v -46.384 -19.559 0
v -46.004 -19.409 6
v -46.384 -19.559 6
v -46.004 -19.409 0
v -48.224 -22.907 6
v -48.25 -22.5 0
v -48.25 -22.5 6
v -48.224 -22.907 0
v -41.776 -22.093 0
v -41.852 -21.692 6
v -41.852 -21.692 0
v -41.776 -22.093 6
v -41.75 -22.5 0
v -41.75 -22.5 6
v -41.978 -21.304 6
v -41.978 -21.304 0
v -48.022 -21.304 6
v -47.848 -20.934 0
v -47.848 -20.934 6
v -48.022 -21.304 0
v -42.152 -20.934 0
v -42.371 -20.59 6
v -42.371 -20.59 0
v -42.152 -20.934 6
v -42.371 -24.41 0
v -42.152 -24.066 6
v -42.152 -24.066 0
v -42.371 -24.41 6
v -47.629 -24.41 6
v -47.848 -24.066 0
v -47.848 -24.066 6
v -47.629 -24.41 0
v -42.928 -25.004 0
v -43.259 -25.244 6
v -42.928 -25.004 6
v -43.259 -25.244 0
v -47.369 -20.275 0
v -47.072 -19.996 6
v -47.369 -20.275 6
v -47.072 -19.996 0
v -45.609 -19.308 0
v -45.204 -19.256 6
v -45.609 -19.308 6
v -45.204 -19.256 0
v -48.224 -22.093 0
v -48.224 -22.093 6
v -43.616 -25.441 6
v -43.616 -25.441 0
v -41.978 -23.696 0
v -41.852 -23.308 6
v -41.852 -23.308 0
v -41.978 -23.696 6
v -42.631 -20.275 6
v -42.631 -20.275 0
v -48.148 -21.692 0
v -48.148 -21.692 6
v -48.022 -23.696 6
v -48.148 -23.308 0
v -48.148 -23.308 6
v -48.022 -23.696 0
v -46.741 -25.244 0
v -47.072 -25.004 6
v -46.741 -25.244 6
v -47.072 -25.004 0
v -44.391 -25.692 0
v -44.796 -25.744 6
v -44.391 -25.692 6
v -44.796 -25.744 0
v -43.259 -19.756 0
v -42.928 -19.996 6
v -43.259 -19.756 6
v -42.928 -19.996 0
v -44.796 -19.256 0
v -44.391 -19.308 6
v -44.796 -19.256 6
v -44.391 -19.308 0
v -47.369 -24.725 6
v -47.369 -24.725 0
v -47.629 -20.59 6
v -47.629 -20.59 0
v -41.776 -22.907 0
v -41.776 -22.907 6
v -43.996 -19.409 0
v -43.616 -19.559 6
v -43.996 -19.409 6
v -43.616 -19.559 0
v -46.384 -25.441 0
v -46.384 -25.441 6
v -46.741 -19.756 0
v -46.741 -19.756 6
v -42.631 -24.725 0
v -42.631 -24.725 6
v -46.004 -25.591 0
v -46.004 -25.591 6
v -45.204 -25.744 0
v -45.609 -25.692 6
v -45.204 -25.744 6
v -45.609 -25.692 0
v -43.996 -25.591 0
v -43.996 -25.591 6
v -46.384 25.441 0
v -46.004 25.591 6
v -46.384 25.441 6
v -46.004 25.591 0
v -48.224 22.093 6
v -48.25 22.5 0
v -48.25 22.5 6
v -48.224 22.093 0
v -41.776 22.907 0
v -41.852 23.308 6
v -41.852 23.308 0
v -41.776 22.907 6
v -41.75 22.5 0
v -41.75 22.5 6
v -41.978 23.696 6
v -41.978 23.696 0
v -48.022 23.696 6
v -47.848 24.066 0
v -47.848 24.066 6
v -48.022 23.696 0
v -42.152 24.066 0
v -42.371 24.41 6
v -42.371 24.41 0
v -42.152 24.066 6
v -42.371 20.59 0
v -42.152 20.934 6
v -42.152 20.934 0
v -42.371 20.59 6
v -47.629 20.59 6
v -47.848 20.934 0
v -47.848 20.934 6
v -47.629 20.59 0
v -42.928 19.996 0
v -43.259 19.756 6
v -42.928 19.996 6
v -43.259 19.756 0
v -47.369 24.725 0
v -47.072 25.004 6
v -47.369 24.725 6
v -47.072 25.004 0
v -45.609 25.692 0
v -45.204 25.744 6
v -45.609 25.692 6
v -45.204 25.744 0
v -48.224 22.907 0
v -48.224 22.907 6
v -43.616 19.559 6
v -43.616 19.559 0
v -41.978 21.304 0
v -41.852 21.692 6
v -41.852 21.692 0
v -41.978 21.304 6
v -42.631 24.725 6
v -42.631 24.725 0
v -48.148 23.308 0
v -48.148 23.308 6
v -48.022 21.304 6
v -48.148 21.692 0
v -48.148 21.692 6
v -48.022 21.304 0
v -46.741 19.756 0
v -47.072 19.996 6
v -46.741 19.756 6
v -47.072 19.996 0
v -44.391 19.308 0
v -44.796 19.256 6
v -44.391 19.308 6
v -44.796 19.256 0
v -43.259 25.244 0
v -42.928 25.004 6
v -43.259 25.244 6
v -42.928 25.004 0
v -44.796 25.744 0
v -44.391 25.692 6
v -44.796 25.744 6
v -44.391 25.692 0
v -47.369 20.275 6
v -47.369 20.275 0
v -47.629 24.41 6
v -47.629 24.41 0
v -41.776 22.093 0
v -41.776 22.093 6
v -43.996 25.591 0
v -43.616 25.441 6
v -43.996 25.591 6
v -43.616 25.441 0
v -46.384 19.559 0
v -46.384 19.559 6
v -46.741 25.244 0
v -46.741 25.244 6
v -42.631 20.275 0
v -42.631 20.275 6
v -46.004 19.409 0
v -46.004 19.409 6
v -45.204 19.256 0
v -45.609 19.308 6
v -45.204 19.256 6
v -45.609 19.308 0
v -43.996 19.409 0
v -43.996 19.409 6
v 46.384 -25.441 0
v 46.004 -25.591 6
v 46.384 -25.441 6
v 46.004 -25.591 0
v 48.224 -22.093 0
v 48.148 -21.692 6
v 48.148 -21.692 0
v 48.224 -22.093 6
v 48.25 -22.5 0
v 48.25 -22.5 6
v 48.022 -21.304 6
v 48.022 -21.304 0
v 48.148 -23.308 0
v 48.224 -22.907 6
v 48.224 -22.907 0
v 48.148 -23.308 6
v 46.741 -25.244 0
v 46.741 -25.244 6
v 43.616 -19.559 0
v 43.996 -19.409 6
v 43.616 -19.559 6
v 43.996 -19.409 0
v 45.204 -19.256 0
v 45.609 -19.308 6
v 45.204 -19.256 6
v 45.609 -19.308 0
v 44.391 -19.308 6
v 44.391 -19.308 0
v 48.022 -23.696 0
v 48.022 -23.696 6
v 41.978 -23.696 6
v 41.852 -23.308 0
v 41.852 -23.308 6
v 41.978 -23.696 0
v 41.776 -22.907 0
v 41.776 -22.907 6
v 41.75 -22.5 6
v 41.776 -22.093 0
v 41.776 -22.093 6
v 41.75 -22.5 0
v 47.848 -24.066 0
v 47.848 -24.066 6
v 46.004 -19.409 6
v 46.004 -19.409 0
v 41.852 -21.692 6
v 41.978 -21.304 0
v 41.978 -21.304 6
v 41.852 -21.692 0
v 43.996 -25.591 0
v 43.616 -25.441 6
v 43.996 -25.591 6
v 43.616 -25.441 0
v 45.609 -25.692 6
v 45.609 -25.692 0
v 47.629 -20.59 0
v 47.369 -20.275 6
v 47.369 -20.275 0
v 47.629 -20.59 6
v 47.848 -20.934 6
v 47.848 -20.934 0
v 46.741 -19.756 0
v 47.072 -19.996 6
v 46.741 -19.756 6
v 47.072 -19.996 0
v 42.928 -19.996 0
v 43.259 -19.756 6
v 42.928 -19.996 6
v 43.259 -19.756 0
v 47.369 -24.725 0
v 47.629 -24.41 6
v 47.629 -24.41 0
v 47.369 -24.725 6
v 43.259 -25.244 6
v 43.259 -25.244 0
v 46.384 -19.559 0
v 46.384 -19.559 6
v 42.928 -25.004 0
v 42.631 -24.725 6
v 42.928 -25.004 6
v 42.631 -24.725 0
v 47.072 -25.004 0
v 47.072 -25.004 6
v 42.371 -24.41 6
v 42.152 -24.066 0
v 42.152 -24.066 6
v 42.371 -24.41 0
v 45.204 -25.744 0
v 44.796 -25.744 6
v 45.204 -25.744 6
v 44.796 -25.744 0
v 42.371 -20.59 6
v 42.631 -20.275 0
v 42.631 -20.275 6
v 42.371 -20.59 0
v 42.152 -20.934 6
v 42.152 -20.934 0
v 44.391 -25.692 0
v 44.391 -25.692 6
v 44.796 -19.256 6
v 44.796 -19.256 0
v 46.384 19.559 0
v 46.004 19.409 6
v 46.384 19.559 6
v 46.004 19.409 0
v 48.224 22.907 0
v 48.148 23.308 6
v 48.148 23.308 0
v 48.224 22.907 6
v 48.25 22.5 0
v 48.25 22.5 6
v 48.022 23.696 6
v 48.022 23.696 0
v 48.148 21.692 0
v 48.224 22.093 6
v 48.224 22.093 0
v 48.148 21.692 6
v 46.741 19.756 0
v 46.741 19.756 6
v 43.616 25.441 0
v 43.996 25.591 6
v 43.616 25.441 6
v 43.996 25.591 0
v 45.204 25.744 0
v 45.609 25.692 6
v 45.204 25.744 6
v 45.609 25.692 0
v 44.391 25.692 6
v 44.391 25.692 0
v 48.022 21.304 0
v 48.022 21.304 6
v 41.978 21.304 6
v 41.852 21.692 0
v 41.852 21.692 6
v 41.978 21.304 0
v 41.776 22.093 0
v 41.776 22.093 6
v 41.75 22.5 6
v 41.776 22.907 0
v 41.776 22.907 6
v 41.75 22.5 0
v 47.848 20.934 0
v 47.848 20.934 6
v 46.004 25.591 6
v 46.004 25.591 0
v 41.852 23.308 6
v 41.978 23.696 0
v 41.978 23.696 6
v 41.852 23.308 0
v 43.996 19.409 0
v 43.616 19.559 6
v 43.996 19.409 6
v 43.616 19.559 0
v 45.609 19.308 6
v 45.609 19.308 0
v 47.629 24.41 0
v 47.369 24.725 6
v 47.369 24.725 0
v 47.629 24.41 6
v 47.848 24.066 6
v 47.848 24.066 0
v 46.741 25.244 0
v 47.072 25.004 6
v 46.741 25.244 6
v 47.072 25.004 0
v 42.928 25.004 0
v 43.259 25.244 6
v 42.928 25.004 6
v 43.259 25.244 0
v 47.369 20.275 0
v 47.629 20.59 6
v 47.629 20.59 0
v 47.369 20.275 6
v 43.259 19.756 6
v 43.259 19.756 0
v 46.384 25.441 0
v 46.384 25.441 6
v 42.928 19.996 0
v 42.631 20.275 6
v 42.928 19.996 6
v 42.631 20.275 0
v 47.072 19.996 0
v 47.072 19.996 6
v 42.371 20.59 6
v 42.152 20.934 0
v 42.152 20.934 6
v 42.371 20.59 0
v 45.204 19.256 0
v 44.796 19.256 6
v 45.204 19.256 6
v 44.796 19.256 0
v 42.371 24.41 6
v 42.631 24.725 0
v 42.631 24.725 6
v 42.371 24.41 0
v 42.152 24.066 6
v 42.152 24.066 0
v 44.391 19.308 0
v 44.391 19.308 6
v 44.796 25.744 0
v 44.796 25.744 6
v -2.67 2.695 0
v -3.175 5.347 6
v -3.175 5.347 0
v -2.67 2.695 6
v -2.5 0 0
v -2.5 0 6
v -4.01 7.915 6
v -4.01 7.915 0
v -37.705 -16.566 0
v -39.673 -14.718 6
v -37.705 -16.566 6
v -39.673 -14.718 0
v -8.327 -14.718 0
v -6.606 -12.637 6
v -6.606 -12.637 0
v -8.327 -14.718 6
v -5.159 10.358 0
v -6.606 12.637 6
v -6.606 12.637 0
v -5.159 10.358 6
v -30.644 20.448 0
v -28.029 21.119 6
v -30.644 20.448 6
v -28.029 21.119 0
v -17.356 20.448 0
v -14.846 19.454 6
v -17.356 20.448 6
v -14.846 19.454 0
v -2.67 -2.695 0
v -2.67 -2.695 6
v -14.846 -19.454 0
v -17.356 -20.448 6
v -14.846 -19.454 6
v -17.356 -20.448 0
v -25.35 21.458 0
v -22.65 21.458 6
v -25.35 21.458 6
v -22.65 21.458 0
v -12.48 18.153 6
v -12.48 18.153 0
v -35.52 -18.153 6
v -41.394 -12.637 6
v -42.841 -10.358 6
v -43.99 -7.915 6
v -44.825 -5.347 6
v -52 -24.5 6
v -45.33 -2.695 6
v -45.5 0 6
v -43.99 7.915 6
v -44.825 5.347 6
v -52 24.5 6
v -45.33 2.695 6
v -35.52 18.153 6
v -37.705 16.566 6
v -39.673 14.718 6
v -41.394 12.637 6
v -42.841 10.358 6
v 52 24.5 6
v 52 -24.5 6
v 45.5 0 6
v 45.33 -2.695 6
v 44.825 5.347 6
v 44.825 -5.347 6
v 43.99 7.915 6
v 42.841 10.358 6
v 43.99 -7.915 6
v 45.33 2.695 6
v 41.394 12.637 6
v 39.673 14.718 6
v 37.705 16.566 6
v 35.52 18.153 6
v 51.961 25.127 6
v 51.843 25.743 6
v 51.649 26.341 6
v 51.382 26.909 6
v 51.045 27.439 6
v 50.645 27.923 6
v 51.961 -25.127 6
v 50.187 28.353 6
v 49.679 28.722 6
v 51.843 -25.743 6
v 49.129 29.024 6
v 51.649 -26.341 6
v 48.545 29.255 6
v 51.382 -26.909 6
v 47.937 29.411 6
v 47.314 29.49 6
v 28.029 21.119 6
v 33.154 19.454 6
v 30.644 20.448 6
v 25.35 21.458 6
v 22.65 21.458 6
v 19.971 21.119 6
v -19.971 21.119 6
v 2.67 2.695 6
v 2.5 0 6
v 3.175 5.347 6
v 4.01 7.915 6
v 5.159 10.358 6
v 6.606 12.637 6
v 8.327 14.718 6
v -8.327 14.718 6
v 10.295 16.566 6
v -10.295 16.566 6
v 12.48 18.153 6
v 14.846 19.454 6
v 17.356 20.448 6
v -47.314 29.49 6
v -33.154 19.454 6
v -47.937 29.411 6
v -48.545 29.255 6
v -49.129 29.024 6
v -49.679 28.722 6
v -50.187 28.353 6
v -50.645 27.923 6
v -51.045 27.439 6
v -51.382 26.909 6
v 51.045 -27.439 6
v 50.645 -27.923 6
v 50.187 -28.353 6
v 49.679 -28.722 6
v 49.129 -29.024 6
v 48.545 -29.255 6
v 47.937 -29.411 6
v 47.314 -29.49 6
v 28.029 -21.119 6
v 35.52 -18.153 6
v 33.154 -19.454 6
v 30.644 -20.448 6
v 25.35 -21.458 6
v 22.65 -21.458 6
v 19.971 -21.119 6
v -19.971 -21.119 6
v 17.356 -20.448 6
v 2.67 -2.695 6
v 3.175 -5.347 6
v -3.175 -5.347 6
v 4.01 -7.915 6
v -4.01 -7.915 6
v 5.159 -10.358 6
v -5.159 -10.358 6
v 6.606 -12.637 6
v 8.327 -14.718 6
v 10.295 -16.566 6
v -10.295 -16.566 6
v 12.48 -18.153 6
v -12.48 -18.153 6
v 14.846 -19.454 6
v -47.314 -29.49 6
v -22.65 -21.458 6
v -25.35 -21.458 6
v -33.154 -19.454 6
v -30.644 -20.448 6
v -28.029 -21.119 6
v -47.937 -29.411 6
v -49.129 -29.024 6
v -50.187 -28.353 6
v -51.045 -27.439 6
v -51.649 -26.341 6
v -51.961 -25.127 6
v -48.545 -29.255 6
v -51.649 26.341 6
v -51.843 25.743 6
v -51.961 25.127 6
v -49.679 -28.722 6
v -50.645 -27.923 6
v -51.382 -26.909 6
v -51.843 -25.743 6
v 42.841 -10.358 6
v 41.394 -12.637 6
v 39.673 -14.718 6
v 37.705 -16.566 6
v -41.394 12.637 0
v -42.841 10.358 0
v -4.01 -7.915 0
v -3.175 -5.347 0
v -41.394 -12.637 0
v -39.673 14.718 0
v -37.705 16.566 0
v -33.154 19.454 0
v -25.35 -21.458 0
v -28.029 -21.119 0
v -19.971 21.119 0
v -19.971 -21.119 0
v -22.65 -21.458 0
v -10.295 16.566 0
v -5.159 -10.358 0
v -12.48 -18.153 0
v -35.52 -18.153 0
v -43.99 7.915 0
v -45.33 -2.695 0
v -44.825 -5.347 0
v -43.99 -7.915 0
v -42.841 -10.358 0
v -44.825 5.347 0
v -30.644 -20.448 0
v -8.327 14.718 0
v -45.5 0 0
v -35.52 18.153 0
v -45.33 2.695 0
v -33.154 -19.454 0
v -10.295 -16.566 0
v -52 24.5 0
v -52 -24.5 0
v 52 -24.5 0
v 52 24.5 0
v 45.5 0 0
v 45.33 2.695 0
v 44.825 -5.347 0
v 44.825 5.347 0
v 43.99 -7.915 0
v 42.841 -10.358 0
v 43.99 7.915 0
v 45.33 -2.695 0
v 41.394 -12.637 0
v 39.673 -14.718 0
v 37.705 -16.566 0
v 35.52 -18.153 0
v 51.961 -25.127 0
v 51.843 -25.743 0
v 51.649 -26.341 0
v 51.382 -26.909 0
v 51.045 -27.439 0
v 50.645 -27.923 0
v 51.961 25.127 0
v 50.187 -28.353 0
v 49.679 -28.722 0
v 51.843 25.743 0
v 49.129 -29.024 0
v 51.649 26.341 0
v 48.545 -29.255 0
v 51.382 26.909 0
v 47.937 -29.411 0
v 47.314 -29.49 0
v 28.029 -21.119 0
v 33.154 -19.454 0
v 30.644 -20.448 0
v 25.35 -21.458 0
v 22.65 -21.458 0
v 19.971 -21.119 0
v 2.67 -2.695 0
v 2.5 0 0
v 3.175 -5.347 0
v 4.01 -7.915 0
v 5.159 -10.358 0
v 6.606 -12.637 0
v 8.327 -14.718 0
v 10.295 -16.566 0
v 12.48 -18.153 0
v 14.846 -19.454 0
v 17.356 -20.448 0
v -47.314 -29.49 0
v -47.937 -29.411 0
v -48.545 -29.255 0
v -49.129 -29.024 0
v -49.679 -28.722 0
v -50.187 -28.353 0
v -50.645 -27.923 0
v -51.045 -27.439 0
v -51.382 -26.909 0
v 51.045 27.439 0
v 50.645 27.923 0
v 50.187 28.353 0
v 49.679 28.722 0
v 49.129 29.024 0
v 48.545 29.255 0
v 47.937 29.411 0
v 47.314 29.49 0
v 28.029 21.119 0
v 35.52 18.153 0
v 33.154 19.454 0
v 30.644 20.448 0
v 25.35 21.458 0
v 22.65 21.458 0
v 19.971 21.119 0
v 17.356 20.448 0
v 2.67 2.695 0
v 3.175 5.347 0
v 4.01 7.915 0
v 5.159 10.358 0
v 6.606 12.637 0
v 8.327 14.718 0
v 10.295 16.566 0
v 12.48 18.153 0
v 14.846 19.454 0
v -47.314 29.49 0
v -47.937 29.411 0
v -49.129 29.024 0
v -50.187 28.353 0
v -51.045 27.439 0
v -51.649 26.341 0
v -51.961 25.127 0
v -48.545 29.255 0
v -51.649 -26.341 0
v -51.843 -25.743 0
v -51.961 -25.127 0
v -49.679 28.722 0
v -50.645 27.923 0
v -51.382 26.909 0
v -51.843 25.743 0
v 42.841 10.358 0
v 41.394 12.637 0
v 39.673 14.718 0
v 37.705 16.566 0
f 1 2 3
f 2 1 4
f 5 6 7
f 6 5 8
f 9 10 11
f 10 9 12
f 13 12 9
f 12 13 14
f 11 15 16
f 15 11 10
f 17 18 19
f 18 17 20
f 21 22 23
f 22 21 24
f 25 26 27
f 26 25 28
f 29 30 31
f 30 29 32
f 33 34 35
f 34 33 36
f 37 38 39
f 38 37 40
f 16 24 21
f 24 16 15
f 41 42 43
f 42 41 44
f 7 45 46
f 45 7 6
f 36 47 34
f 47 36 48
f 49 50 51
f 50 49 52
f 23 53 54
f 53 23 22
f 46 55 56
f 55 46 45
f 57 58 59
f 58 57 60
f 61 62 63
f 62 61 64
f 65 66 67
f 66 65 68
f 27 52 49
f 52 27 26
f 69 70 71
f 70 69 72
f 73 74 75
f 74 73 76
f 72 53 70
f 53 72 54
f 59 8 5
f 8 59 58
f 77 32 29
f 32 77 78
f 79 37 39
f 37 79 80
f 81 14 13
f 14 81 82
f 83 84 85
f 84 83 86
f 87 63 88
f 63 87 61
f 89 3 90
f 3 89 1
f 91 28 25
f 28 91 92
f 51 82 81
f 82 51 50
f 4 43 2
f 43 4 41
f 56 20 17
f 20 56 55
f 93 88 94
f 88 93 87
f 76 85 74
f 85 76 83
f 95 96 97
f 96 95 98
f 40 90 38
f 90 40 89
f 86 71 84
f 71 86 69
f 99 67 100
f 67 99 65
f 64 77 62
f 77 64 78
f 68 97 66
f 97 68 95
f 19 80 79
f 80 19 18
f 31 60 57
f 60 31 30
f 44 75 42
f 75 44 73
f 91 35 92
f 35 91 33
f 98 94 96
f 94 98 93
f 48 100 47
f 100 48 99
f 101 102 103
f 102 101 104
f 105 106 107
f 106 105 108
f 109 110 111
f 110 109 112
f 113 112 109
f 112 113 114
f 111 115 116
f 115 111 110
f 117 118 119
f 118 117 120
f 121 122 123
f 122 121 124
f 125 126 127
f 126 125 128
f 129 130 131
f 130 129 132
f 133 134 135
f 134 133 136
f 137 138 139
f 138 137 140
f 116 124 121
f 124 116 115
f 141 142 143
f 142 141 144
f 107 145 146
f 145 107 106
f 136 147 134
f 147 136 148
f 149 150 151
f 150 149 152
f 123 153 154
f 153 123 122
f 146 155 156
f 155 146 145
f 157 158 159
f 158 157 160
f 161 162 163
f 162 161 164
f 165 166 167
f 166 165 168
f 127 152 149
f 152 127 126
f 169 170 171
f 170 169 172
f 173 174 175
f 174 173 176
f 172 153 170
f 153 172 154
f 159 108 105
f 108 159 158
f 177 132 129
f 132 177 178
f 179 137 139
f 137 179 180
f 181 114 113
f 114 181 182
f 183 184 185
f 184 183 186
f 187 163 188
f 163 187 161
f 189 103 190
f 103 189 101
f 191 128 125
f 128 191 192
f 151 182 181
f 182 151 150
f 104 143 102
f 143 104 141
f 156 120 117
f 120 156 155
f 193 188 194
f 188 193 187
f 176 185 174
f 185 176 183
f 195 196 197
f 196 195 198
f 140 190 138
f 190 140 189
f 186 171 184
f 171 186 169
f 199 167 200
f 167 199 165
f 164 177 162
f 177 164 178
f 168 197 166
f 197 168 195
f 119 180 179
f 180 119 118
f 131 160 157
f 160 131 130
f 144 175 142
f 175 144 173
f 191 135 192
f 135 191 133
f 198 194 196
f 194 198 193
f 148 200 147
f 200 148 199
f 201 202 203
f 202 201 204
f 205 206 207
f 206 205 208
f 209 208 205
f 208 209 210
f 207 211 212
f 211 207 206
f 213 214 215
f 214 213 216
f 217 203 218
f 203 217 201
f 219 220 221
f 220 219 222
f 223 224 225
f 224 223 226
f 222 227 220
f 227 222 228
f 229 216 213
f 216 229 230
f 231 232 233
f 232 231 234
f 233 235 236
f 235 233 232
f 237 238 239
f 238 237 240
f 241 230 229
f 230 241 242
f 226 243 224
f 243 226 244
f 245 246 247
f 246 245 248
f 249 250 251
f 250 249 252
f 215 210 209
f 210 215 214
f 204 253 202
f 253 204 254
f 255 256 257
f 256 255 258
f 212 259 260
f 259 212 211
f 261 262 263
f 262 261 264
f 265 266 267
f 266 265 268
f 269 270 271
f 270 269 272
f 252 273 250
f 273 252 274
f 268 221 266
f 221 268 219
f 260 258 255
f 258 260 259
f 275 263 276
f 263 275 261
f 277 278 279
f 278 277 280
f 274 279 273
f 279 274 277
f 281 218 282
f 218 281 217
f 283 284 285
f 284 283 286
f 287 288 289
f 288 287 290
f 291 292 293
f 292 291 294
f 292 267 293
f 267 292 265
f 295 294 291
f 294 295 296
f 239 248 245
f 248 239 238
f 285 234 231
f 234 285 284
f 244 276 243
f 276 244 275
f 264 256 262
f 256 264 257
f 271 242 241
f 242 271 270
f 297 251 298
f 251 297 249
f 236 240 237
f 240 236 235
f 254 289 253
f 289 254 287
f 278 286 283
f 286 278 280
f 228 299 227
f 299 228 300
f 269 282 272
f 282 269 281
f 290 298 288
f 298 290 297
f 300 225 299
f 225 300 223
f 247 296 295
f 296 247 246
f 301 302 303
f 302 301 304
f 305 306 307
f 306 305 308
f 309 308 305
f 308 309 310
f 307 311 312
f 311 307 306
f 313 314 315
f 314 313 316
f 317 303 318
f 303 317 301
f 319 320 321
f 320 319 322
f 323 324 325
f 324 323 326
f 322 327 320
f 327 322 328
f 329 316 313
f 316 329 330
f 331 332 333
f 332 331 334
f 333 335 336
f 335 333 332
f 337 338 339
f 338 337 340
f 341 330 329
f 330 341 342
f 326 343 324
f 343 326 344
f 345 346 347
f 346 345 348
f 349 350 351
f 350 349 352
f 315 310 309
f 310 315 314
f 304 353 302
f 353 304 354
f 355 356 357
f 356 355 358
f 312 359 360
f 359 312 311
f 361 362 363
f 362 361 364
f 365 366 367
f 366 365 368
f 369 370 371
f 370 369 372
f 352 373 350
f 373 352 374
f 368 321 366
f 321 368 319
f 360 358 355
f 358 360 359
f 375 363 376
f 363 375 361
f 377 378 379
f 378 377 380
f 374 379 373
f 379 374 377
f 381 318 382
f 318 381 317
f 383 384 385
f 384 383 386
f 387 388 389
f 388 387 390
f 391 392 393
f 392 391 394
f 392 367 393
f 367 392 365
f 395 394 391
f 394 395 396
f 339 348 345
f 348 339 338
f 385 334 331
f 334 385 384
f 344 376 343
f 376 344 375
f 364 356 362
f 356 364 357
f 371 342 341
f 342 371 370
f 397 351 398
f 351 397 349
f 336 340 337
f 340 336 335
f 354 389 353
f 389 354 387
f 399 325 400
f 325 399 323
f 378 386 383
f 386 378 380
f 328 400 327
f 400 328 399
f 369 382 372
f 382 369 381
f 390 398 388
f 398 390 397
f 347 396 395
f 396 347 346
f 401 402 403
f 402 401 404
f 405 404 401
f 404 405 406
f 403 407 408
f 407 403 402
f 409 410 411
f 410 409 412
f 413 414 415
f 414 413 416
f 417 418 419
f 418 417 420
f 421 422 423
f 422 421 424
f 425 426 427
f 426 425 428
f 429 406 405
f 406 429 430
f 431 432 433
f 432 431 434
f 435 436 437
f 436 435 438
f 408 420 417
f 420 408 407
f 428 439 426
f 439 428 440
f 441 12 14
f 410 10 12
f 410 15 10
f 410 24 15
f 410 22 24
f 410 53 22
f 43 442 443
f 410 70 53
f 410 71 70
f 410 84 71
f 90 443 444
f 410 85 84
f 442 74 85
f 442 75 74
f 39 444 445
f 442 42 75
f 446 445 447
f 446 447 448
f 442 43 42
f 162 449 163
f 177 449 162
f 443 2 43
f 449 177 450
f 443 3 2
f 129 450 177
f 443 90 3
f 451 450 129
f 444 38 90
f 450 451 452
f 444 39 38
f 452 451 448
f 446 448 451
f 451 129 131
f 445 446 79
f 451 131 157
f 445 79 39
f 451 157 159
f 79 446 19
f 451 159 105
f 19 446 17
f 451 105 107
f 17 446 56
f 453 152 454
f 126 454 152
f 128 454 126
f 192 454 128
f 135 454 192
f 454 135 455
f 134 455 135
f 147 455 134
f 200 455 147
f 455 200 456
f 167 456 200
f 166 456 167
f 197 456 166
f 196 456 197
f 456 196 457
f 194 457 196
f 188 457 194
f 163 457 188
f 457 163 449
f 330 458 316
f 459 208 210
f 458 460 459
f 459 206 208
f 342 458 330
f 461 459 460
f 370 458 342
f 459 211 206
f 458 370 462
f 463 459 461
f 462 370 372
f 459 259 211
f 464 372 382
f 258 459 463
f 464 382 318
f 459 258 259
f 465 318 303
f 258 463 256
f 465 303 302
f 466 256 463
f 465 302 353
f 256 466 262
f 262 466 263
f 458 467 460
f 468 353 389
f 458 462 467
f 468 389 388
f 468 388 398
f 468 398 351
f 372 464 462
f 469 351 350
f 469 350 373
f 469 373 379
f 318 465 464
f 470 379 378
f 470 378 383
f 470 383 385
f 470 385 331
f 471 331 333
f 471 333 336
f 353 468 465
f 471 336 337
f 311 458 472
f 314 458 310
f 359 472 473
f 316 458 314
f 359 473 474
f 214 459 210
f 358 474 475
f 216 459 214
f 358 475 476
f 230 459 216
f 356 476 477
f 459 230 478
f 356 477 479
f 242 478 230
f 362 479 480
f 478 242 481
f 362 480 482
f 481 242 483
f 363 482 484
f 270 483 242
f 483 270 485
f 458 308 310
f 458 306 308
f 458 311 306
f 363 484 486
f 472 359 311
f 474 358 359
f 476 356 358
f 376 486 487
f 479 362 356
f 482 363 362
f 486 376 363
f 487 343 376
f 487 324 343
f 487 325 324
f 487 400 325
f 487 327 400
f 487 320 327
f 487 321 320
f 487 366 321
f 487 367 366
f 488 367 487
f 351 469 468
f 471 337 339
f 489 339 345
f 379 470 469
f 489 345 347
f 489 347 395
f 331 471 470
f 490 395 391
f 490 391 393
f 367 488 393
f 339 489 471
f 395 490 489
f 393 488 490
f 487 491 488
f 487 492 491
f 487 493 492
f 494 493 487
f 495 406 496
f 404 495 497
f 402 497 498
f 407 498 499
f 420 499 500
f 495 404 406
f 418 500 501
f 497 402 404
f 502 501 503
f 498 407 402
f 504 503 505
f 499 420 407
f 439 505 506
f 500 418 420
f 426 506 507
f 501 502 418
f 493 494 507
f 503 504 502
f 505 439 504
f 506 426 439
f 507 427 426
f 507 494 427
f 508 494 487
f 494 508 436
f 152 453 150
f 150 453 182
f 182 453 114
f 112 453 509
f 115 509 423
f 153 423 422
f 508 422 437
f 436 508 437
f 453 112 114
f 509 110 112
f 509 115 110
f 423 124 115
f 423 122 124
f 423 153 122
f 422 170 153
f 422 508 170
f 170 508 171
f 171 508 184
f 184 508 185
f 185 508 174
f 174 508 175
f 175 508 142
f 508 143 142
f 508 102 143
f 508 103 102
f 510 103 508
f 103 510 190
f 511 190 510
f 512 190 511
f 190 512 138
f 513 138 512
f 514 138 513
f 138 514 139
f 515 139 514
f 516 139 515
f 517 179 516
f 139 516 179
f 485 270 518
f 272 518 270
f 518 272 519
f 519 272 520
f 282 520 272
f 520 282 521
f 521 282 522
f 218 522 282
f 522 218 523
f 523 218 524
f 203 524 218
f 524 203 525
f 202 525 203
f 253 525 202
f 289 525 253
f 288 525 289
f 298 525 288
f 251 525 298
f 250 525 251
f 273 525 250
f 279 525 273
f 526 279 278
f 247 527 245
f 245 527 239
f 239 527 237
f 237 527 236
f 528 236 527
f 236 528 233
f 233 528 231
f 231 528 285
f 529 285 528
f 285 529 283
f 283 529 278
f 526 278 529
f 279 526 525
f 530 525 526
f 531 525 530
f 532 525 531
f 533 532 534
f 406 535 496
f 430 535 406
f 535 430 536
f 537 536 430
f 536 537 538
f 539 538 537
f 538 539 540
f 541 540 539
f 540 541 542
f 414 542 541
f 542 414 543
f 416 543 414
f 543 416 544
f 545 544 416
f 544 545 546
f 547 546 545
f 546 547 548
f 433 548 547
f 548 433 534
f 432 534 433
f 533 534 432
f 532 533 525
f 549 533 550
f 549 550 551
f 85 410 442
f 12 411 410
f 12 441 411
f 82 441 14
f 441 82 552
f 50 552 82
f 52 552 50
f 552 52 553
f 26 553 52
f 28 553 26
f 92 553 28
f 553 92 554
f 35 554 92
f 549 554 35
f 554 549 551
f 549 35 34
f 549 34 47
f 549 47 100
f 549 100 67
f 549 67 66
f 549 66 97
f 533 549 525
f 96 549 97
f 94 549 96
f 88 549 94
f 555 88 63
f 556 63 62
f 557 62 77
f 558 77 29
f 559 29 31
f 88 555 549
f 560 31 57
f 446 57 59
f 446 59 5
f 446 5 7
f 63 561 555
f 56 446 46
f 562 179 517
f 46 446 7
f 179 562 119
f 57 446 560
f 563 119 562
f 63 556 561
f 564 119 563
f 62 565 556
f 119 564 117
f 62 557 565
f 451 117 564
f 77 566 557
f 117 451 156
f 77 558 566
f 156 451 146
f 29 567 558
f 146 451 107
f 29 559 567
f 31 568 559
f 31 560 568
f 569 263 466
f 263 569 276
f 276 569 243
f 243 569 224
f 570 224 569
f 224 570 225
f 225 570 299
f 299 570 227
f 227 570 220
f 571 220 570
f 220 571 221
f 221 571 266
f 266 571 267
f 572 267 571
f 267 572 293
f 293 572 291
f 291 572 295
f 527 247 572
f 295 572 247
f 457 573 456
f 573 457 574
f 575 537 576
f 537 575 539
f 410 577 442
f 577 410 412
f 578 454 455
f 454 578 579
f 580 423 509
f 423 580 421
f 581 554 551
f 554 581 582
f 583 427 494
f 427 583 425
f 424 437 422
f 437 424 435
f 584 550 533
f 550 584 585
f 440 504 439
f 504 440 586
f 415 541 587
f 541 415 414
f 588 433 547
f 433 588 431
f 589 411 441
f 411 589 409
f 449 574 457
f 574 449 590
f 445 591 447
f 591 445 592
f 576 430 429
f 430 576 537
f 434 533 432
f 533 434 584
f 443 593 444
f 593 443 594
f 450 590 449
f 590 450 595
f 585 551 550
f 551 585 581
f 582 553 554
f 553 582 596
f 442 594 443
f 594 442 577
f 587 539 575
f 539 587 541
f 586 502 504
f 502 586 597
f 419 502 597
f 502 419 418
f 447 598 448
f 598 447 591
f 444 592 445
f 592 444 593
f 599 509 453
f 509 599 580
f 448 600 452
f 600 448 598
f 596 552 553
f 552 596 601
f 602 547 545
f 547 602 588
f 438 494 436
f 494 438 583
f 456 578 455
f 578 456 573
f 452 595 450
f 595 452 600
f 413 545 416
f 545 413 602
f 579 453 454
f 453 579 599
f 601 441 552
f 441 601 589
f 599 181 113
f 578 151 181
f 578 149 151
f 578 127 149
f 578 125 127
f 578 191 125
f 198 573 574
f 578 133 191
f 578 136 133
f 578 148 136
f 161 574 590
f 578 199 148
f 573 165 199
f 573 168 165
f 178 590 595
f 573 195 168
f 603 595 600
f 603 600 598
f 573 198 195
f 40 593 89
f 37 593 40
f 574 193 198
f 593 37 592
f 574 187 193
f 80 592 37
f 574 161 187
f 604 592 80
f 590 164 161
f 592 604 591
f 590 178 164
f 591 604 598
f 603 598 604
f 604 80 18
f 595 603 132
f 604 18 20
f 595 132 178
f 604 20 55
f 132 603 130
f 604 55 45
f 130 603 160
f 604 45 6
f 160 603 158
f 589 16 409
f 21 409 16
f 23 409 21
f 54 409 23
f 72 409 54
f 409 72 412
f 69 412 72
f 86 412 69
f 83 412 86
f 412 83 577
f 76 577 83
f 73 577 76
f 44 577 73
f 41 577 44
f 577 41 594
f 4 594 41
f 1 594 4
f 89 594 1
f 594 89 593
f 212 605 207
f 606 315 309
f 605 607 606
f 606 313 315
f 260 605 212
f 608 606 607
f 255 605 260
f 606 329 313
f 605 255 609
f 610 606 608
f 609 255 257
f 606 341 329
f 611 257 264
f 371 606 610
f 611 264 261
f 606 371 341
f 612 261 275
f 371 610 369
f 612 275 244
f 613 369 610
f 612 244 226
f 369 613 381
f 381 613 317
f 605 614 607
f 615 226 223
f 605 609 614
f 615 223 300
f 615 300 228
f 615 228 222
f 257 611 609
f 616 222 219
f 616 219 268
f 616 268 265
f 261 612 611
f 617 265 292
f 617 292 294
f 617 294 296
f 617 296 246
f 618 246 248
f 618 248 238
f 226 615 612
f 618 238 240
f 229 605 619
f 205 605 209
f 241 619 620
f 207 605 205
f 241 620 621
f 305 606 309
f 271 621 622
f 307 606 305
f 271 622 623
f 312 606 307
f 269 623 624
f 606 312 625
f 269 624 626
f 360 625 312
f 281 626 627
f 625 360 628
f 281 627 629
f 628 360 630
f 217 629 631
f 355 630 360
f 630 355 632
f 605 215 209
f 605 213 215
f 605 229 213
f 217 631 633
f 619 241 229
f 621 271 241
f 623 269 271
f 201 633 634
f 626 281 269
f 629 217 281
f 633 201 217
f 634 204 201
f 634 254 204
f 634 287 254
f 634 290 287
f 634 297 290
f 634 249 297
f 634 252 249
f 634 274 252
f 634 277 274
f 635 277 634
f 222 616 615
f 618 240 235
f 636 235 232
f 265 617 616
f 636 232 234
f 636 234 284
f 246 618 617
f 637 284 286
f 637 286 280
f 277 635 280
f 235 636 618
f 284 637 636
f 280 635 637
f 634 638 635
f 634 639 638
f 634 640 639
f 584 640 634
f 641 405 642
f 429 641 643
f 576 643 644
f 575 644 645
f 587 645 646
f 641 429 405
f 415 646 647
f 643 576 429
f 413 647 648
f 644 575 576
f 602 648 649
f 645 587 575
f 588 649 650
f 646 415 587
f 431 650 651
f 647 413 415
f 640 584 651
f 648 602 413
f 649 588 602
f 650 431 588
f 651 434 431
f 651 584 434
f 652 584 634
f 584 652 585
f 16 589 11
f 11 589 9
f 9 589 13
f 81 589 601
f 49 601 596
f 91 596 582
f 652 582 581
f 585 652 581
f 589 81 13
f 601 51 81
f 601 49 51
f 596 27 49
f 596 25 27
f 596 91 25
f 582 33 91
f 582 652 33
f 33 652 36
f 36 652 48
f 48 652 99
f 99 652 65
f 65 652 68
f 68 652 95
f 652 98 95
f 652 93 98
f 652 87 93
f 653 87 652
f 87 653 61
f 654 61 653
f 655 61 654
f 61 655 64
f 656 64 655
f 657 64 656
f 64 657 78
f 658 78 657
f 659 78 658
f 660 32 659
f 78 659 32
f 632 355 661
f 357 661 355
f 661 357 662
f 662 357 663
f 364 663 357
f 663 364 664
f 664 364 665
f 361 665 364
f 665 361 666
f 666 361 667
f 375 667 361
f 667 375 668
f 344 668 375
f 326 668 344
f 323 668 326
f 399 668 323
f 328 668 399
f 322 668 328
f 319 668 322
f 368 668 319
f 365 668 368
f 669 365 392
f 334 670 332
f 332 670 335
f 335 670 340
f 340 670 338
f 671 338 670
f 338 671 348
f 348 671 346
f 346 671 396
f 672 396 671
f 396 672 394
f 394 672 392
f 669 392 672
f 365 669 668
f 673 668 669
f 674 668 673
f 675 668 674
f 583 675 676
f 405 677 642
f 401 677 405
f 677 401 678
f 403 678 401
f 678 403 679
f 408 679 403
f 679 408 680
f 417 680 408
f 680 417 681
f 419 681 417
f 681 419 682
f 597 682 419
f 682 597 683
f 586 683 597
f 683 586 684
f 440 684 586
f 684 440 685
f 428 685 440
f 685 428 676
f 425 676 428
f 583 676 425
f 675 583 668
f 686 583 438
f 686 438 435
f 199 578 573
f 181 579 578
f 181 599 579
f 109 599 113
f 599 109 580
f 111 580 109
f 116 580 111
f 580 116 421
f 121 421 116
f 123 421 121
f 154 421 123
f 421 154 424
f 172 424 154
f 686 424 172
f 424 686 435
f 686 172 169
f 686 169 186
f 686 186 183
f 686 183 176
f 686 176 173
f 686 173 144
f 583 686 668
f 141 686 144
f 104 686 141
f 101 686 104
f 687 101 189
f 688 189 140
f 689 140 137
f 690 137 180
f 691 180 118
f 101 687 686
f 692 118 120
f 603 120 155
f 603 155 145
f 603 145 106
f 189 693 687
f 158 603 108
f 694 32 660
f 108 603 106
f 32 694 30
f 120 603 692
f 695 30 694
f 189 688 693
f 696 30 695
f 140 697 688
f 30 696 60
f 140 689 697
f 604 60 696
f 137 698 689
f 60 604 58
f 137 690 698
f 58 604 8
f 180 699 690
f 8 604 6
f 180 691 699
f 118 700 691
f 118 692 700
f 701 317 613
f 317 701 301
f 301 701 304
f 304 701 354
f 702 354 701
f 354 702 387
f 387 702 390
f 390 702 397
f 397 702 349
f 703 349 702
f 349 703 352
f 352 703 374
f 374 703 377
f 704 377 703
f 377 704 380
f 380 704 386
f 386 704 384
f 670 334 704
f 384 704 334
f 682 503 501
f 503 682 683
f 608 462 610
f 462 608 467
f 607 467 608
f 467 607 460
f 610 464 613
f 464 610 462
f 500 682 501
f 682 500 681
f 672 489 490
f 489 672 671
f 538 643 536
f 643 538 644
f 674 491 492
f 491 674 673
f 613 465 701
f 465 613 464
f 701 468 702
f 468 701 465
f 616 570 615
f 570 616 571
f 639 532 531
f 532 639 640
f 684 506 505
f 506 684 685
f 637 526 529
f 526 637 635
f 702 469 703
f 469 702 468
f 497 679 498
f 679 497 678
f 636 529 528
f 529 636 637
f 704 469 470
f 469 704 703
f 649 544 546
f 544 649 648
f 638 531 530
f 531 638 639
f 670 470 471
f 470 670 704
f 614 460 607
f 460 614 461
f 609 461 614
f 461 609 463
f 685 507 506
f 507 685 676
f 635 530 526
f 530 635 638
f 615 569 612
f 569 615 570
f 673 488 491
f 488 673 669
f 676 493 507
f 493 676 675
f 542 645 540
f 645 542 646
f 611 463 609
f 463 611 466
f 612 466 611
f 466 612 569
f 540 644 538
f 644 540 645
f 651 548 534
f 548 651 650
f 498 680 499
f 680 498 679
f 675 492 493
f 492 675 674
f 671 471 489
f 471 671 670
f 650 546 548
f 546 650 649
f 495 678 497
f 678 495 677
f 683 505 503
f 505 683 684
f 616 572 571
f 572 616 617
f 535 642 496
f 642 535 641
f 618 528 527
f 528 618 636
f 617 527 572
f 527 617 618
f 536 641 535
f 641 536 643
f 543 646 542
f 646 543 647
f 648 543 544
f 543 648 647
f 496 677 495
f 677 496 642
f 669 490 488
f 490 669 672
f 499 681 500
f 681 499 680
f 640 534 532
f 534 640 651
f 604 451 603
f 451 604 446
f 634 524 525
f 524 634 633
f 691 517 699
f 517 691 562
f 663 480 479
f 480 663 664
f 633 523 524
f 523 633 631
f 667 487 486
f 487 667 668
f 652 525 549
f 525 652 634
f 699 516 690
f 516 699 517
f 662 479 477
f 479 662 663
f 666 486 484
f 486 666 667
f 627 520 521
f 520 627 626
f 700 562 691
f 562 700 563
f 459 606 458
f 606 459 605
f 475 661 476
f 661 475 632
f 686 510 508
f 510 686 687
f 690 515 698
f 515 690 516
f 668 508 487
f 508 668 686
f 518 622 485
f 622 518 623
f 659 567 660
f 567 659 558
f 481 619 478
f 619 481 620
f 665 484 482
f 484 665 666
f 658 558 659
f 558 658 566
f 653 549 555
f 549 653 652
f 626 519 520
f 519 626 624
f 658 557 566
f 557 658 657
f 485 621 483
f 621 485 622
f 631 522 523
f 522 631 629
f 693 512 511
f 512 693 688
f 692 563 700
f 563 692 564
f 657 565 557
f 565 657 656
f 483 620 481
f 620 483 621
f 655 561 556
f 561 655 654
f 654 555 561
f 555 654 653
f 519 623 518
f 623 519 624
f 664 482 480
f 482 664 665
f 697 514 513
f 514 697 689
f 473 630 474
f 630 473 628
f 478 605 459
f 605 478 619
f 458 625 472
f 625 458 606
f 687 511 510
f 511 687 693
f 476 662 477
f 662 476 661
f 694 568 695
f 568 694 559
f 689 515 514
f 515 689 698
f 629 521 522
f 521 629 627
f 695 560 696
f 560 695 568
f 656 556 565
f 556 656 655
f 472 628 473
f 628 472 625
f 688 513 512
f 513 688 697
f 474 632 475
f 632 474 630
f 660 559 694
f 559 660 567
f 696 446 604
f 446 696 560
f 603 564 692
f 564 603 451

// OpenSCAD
$fn = 50;

difference() {
	union() {
		hull() {
			translate(v = [-47.0, 24.5, 0]) {
				cylinder(h = 6, r = 5);
			}
			translate(v = [47.0, 24.5, 0]) {
				cylinder(h = 6, r = 5);
			}
			translate(v = [-47.0, -24.5, 0]) {
				cylinder(h = 6, r = 5);
			}
			translate(v = [47.0, -24.5, 0]) {
				cylinder(h = 6, r = 5);
			}
		}
	}
	union() {
		translate(v = [-45.0, -22.5, -100.0]) {
			cylinder(h = 200, r = 3.25);
		}
		translate(v = [-45.0, 22.5, -100.0]) {
			cylinder(h = 200, r = 3.25);
		}
		translate(v = [45.0, -22.5, -100.0]) {
			cylinder(h = 200, r = 3.25);
		}
		translate(v = [45.0, 22.5, -100.0]) {
			cylinder(h = 200, r = 3.25);
		}
		translate(v = [-45.0, -22.5, -100.0]) {
			cylinder(h = 200, r = 1.8);
		}
		translate(v = [-45.0, 22.5, -100.0]) {
			cylinder(h = 200, r = 1.8);
		}
		translate(v = [45.0, -22.5, -100.0]) {
			cylinder(h = 200, r = 1.8);
		}
		translate(v = [45.0, 22.5, -100.0]) {
			cylinder(h = 200, r = 1.8);
		}
		translate(v = [-24.0, 0, 0.0]) {
			cylinder(h = 6, r = 21.5);
		}
		translate(v = [24.0, 0, 0.0]) {
			cylinder(h = 6, r = 21.5);
		}
	}
}
